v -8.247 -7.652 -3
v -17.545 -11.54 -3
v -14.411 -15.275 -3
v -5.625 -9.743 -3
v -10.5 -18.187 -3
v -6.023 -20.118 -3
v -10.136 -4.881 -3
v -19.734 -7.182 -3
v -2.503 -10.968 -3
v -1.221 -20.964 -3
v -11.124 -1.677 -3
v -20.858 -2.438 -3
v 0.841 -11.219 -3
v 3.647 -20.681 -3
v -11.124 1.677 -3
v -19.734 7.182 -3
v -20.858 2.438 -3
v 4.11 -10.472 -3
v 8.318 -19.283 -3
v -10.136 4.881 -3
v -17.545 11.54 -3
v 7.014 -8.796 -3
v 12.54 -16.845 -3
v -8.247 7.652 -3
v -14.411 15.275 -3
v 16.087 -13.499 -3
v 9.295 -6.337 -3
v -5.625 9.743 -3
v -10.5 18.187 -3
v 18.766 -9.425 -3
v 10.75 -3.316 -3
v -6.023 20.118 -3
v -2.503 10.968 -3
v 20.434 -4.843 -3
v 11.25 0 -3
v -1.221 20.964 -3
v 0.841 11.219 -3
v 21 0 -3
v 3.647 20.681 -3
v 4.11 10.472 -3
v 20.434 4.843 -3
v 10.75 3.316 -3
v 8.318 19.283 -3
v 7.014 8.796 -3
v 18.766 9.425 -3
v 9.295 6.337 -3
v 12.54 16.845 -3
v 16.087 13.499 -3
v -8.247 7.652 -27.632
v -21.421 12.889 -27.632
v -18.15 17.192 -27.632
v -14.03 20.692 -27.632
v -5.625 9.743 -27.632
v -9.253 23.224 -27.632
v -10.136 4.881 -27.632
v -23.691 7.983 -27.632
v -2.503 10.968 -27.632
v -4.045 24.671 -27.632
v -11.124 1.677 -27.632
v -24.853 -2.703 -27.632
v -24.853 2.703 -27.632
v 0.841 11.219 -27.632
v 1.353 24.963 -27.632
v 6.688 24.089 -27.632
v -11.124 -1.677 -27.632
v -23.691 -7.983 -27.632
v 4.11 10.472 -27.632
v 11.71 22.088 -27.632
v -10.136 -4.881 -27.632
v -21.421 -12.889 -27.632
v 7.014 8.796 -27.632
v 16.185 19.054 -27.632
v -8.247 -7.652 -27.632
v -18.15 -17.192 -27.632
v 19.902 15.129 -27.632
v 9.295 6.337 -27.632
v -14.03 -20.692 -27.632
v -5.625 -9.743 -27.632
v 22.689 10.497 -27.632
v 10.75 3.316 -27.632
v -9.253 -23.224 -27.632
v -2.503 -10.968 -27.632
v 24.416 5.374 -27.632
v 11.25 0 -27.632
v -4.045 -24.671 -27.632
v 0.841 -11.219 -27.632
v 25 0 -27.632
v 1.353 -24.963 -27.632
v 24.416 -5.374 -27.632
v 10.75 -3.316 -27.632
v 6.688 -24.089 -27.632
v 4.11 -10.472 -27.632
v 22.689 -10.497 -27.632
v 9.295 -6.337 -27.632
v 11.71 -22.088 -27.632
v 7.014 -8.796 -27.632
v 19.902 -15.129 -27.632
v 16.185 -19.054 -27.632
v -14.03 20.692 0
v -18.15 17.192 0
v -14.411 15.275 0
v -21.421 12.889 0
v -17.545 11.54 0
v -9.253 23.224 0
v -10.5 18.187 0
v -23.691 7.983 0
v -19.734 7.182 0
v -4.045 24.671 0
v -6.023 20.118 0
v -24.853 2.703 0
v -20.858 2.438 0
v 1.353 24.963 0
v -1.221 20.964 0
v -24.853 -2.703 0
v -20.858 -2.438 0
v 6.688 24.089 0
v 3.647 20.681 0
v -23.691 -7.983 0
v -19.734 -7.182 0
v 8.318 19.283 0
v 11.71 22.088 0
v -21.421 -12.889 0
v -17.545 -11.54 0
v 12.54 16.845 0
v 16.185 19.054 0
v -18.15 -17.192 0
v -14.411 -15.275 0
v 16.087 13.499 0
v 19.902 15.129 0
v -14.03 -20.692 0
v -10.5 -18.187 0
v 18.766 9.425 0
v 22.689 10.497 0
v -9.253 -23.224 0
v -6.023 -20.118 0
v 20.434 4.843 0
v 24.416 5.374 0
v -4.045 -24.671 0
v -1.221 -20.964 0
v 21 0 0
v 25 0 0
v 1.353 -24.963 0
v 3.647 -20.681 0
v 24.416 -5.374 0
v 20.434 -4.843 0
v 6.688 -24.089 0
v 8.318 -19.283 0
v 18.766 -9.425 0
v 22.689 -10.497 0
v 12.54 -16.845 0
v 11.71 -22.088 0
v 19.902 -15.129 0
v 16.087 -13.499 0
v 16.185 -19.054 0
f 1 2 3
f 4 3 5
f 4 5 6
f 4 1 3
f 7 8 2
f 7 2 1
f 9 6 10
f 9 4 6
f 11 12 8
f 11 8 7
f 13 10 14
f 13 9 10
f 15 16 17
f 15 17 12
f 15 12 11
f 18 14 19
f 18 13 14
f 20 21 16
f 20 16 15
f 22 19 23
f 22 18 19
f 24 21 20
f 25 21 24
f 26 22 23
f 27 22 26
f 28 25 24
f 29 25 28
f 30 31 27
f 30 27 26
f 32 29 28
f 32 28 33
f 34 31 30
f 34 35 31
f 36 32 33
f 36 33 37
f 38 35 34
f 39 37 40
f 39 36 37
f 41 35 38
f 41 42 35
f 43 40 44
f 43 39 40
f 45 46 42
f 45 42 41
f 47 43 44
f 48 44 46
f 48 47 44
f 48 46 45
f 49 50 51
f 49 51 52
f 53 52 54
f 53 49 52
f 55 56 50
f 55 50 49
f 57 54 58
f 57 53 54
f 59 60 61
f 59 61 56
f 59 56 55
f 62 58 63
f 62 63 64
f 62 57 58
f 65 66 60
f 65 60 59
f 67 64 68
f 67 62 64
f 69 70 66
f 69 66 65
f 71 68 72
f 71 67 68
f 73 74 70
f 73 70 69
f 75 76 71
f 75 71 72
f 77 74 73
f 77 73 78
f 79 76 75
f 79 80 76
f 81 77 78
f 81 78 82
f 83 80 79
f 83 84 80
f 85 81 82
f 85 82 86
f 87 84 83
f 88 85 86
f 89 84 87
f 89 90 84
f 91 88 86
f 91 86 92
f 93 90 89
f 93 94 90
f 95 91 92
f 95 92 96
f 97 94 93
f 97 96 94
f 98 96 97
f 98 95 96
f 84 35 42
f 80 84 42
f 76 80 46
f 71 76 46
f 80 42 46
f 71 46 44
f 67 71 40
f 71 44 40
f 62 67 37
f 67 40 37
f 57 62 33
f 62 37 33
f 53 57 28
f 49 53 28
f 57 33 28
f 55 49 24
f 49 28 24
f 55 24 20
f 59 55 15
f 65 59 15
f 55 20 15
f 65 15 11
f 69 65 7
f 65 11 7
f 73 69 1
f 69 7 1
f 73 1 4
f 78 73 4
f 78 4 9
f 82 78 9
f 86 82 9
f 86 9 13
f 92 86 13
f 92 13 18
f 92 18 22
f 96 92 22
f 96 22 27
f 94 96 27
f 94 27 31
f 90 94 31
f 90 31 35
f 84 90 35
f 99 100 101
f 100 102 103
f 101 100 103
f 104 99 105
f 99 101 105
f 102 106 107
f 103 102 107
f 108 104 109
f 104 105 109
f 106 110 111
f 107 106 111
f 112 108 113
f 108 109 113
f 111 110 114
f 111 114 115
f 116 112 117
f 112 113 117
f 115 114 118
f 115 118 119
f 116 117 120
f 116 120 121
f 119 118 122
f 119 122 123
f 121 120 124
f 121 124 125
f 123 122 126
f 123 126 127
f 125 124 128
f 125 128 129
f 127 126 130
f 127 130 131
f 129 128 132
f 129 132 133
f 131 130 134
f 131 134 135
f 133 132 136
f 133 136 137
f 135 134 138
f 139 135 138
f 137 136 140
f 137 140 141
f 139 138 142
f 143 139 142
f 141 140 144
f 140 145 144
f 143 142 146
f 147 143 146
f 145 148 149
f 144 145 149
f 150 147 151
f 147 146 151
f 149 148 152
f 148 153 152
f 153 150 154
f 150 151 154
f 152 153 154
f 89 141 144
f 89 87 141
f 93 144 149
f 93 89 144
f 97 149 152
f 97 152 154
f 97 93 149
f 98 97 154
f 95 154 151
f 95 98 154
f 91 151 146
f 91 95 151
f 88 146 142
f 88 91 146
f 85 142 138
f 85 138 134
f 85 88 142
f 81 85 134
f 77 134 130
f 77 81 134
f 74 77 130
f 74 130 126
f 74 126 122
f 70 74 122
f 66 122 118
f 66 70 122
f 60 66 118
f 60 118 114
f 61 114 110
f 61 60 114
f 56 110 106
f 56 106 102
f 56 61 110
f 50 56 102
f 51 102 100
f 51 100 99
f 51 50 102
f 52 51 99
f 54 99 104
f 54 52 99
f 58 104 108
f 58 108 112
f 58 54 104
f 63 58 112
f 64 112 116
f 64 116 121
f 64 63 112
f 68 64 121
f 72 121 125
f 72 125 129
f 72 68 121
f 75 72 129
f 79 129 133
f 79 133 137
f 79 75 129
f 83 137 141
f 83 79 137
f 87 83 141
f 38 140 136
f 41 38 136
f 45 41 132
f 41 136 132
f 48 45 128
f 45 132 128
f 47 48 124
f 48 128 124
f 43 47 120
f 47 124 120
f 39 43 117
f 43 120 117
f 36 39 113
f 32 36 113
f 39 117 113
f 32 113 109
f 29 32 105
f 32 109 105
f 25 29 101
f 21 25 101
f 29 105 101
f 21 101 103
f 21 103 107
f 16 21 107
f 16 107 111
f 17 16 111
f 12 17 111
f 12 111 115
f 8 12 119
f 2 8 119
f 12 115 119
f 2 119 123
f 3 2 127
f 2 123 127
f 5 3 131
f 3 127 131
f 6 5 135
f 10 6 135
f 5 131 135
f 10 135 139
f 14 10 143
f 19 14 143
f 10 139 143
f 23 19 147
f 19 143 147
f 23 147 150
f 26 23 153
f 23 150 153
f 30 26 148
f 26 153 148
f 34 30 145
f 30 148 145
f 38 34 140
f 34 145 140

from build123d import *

# Parameters (mm, degrees)
CROQUIS3_W            = 27.632411408
CROQUIS3_H            = 25
CROQUIS5_R            = 11.25
CORTAR_EXTRUIR1_DEPTH = 45.872599214
CROQUIS6_R            = 21
CORTAR_EXTRUIR2_DEPTH = 3


with BuildPart() as part:
    # Croquis3 → Revolución5 (revolve)
    with BuildSketch(Plane(origin=(0, 0, 0), x_dir=(0, 0, -1), z_dir=(1, 0, 0)), mode=Mode.PRIVATE) as revoluci_n5_sk:
        with Locations((13.816205704, -12.5)):
            Rectangle(CROQUIS3_W, CROQUIS3_H)
    revolve(revoluci_n5_sk.sketch.rotate(Axis((0, 0, 45.885013439), (0, 0, -1)), 270), axis=Axis((0, 0, 45.885013439), (0, 0, -1)))

    # Croquis5 → Cortar-Extruir1 (cut, through all)
    with BuildSketch(Plane.XY):
        Circle(CROQUIS5_R)
    extrude(amount=-CORTAR_EXTRUIR1_DEPTH, mode=Mode.SUBTRACT)

    # Croquis6 → Cortar-Extruir2 (cut)
    with BuildSketch(Plane.XY):
        Circle(CROQUIS6_R)
    extrude(amount=-CORTAR_EXTRUIR2_DEPTH, mode=Mode.SUBTRACT)


solid = part.part
